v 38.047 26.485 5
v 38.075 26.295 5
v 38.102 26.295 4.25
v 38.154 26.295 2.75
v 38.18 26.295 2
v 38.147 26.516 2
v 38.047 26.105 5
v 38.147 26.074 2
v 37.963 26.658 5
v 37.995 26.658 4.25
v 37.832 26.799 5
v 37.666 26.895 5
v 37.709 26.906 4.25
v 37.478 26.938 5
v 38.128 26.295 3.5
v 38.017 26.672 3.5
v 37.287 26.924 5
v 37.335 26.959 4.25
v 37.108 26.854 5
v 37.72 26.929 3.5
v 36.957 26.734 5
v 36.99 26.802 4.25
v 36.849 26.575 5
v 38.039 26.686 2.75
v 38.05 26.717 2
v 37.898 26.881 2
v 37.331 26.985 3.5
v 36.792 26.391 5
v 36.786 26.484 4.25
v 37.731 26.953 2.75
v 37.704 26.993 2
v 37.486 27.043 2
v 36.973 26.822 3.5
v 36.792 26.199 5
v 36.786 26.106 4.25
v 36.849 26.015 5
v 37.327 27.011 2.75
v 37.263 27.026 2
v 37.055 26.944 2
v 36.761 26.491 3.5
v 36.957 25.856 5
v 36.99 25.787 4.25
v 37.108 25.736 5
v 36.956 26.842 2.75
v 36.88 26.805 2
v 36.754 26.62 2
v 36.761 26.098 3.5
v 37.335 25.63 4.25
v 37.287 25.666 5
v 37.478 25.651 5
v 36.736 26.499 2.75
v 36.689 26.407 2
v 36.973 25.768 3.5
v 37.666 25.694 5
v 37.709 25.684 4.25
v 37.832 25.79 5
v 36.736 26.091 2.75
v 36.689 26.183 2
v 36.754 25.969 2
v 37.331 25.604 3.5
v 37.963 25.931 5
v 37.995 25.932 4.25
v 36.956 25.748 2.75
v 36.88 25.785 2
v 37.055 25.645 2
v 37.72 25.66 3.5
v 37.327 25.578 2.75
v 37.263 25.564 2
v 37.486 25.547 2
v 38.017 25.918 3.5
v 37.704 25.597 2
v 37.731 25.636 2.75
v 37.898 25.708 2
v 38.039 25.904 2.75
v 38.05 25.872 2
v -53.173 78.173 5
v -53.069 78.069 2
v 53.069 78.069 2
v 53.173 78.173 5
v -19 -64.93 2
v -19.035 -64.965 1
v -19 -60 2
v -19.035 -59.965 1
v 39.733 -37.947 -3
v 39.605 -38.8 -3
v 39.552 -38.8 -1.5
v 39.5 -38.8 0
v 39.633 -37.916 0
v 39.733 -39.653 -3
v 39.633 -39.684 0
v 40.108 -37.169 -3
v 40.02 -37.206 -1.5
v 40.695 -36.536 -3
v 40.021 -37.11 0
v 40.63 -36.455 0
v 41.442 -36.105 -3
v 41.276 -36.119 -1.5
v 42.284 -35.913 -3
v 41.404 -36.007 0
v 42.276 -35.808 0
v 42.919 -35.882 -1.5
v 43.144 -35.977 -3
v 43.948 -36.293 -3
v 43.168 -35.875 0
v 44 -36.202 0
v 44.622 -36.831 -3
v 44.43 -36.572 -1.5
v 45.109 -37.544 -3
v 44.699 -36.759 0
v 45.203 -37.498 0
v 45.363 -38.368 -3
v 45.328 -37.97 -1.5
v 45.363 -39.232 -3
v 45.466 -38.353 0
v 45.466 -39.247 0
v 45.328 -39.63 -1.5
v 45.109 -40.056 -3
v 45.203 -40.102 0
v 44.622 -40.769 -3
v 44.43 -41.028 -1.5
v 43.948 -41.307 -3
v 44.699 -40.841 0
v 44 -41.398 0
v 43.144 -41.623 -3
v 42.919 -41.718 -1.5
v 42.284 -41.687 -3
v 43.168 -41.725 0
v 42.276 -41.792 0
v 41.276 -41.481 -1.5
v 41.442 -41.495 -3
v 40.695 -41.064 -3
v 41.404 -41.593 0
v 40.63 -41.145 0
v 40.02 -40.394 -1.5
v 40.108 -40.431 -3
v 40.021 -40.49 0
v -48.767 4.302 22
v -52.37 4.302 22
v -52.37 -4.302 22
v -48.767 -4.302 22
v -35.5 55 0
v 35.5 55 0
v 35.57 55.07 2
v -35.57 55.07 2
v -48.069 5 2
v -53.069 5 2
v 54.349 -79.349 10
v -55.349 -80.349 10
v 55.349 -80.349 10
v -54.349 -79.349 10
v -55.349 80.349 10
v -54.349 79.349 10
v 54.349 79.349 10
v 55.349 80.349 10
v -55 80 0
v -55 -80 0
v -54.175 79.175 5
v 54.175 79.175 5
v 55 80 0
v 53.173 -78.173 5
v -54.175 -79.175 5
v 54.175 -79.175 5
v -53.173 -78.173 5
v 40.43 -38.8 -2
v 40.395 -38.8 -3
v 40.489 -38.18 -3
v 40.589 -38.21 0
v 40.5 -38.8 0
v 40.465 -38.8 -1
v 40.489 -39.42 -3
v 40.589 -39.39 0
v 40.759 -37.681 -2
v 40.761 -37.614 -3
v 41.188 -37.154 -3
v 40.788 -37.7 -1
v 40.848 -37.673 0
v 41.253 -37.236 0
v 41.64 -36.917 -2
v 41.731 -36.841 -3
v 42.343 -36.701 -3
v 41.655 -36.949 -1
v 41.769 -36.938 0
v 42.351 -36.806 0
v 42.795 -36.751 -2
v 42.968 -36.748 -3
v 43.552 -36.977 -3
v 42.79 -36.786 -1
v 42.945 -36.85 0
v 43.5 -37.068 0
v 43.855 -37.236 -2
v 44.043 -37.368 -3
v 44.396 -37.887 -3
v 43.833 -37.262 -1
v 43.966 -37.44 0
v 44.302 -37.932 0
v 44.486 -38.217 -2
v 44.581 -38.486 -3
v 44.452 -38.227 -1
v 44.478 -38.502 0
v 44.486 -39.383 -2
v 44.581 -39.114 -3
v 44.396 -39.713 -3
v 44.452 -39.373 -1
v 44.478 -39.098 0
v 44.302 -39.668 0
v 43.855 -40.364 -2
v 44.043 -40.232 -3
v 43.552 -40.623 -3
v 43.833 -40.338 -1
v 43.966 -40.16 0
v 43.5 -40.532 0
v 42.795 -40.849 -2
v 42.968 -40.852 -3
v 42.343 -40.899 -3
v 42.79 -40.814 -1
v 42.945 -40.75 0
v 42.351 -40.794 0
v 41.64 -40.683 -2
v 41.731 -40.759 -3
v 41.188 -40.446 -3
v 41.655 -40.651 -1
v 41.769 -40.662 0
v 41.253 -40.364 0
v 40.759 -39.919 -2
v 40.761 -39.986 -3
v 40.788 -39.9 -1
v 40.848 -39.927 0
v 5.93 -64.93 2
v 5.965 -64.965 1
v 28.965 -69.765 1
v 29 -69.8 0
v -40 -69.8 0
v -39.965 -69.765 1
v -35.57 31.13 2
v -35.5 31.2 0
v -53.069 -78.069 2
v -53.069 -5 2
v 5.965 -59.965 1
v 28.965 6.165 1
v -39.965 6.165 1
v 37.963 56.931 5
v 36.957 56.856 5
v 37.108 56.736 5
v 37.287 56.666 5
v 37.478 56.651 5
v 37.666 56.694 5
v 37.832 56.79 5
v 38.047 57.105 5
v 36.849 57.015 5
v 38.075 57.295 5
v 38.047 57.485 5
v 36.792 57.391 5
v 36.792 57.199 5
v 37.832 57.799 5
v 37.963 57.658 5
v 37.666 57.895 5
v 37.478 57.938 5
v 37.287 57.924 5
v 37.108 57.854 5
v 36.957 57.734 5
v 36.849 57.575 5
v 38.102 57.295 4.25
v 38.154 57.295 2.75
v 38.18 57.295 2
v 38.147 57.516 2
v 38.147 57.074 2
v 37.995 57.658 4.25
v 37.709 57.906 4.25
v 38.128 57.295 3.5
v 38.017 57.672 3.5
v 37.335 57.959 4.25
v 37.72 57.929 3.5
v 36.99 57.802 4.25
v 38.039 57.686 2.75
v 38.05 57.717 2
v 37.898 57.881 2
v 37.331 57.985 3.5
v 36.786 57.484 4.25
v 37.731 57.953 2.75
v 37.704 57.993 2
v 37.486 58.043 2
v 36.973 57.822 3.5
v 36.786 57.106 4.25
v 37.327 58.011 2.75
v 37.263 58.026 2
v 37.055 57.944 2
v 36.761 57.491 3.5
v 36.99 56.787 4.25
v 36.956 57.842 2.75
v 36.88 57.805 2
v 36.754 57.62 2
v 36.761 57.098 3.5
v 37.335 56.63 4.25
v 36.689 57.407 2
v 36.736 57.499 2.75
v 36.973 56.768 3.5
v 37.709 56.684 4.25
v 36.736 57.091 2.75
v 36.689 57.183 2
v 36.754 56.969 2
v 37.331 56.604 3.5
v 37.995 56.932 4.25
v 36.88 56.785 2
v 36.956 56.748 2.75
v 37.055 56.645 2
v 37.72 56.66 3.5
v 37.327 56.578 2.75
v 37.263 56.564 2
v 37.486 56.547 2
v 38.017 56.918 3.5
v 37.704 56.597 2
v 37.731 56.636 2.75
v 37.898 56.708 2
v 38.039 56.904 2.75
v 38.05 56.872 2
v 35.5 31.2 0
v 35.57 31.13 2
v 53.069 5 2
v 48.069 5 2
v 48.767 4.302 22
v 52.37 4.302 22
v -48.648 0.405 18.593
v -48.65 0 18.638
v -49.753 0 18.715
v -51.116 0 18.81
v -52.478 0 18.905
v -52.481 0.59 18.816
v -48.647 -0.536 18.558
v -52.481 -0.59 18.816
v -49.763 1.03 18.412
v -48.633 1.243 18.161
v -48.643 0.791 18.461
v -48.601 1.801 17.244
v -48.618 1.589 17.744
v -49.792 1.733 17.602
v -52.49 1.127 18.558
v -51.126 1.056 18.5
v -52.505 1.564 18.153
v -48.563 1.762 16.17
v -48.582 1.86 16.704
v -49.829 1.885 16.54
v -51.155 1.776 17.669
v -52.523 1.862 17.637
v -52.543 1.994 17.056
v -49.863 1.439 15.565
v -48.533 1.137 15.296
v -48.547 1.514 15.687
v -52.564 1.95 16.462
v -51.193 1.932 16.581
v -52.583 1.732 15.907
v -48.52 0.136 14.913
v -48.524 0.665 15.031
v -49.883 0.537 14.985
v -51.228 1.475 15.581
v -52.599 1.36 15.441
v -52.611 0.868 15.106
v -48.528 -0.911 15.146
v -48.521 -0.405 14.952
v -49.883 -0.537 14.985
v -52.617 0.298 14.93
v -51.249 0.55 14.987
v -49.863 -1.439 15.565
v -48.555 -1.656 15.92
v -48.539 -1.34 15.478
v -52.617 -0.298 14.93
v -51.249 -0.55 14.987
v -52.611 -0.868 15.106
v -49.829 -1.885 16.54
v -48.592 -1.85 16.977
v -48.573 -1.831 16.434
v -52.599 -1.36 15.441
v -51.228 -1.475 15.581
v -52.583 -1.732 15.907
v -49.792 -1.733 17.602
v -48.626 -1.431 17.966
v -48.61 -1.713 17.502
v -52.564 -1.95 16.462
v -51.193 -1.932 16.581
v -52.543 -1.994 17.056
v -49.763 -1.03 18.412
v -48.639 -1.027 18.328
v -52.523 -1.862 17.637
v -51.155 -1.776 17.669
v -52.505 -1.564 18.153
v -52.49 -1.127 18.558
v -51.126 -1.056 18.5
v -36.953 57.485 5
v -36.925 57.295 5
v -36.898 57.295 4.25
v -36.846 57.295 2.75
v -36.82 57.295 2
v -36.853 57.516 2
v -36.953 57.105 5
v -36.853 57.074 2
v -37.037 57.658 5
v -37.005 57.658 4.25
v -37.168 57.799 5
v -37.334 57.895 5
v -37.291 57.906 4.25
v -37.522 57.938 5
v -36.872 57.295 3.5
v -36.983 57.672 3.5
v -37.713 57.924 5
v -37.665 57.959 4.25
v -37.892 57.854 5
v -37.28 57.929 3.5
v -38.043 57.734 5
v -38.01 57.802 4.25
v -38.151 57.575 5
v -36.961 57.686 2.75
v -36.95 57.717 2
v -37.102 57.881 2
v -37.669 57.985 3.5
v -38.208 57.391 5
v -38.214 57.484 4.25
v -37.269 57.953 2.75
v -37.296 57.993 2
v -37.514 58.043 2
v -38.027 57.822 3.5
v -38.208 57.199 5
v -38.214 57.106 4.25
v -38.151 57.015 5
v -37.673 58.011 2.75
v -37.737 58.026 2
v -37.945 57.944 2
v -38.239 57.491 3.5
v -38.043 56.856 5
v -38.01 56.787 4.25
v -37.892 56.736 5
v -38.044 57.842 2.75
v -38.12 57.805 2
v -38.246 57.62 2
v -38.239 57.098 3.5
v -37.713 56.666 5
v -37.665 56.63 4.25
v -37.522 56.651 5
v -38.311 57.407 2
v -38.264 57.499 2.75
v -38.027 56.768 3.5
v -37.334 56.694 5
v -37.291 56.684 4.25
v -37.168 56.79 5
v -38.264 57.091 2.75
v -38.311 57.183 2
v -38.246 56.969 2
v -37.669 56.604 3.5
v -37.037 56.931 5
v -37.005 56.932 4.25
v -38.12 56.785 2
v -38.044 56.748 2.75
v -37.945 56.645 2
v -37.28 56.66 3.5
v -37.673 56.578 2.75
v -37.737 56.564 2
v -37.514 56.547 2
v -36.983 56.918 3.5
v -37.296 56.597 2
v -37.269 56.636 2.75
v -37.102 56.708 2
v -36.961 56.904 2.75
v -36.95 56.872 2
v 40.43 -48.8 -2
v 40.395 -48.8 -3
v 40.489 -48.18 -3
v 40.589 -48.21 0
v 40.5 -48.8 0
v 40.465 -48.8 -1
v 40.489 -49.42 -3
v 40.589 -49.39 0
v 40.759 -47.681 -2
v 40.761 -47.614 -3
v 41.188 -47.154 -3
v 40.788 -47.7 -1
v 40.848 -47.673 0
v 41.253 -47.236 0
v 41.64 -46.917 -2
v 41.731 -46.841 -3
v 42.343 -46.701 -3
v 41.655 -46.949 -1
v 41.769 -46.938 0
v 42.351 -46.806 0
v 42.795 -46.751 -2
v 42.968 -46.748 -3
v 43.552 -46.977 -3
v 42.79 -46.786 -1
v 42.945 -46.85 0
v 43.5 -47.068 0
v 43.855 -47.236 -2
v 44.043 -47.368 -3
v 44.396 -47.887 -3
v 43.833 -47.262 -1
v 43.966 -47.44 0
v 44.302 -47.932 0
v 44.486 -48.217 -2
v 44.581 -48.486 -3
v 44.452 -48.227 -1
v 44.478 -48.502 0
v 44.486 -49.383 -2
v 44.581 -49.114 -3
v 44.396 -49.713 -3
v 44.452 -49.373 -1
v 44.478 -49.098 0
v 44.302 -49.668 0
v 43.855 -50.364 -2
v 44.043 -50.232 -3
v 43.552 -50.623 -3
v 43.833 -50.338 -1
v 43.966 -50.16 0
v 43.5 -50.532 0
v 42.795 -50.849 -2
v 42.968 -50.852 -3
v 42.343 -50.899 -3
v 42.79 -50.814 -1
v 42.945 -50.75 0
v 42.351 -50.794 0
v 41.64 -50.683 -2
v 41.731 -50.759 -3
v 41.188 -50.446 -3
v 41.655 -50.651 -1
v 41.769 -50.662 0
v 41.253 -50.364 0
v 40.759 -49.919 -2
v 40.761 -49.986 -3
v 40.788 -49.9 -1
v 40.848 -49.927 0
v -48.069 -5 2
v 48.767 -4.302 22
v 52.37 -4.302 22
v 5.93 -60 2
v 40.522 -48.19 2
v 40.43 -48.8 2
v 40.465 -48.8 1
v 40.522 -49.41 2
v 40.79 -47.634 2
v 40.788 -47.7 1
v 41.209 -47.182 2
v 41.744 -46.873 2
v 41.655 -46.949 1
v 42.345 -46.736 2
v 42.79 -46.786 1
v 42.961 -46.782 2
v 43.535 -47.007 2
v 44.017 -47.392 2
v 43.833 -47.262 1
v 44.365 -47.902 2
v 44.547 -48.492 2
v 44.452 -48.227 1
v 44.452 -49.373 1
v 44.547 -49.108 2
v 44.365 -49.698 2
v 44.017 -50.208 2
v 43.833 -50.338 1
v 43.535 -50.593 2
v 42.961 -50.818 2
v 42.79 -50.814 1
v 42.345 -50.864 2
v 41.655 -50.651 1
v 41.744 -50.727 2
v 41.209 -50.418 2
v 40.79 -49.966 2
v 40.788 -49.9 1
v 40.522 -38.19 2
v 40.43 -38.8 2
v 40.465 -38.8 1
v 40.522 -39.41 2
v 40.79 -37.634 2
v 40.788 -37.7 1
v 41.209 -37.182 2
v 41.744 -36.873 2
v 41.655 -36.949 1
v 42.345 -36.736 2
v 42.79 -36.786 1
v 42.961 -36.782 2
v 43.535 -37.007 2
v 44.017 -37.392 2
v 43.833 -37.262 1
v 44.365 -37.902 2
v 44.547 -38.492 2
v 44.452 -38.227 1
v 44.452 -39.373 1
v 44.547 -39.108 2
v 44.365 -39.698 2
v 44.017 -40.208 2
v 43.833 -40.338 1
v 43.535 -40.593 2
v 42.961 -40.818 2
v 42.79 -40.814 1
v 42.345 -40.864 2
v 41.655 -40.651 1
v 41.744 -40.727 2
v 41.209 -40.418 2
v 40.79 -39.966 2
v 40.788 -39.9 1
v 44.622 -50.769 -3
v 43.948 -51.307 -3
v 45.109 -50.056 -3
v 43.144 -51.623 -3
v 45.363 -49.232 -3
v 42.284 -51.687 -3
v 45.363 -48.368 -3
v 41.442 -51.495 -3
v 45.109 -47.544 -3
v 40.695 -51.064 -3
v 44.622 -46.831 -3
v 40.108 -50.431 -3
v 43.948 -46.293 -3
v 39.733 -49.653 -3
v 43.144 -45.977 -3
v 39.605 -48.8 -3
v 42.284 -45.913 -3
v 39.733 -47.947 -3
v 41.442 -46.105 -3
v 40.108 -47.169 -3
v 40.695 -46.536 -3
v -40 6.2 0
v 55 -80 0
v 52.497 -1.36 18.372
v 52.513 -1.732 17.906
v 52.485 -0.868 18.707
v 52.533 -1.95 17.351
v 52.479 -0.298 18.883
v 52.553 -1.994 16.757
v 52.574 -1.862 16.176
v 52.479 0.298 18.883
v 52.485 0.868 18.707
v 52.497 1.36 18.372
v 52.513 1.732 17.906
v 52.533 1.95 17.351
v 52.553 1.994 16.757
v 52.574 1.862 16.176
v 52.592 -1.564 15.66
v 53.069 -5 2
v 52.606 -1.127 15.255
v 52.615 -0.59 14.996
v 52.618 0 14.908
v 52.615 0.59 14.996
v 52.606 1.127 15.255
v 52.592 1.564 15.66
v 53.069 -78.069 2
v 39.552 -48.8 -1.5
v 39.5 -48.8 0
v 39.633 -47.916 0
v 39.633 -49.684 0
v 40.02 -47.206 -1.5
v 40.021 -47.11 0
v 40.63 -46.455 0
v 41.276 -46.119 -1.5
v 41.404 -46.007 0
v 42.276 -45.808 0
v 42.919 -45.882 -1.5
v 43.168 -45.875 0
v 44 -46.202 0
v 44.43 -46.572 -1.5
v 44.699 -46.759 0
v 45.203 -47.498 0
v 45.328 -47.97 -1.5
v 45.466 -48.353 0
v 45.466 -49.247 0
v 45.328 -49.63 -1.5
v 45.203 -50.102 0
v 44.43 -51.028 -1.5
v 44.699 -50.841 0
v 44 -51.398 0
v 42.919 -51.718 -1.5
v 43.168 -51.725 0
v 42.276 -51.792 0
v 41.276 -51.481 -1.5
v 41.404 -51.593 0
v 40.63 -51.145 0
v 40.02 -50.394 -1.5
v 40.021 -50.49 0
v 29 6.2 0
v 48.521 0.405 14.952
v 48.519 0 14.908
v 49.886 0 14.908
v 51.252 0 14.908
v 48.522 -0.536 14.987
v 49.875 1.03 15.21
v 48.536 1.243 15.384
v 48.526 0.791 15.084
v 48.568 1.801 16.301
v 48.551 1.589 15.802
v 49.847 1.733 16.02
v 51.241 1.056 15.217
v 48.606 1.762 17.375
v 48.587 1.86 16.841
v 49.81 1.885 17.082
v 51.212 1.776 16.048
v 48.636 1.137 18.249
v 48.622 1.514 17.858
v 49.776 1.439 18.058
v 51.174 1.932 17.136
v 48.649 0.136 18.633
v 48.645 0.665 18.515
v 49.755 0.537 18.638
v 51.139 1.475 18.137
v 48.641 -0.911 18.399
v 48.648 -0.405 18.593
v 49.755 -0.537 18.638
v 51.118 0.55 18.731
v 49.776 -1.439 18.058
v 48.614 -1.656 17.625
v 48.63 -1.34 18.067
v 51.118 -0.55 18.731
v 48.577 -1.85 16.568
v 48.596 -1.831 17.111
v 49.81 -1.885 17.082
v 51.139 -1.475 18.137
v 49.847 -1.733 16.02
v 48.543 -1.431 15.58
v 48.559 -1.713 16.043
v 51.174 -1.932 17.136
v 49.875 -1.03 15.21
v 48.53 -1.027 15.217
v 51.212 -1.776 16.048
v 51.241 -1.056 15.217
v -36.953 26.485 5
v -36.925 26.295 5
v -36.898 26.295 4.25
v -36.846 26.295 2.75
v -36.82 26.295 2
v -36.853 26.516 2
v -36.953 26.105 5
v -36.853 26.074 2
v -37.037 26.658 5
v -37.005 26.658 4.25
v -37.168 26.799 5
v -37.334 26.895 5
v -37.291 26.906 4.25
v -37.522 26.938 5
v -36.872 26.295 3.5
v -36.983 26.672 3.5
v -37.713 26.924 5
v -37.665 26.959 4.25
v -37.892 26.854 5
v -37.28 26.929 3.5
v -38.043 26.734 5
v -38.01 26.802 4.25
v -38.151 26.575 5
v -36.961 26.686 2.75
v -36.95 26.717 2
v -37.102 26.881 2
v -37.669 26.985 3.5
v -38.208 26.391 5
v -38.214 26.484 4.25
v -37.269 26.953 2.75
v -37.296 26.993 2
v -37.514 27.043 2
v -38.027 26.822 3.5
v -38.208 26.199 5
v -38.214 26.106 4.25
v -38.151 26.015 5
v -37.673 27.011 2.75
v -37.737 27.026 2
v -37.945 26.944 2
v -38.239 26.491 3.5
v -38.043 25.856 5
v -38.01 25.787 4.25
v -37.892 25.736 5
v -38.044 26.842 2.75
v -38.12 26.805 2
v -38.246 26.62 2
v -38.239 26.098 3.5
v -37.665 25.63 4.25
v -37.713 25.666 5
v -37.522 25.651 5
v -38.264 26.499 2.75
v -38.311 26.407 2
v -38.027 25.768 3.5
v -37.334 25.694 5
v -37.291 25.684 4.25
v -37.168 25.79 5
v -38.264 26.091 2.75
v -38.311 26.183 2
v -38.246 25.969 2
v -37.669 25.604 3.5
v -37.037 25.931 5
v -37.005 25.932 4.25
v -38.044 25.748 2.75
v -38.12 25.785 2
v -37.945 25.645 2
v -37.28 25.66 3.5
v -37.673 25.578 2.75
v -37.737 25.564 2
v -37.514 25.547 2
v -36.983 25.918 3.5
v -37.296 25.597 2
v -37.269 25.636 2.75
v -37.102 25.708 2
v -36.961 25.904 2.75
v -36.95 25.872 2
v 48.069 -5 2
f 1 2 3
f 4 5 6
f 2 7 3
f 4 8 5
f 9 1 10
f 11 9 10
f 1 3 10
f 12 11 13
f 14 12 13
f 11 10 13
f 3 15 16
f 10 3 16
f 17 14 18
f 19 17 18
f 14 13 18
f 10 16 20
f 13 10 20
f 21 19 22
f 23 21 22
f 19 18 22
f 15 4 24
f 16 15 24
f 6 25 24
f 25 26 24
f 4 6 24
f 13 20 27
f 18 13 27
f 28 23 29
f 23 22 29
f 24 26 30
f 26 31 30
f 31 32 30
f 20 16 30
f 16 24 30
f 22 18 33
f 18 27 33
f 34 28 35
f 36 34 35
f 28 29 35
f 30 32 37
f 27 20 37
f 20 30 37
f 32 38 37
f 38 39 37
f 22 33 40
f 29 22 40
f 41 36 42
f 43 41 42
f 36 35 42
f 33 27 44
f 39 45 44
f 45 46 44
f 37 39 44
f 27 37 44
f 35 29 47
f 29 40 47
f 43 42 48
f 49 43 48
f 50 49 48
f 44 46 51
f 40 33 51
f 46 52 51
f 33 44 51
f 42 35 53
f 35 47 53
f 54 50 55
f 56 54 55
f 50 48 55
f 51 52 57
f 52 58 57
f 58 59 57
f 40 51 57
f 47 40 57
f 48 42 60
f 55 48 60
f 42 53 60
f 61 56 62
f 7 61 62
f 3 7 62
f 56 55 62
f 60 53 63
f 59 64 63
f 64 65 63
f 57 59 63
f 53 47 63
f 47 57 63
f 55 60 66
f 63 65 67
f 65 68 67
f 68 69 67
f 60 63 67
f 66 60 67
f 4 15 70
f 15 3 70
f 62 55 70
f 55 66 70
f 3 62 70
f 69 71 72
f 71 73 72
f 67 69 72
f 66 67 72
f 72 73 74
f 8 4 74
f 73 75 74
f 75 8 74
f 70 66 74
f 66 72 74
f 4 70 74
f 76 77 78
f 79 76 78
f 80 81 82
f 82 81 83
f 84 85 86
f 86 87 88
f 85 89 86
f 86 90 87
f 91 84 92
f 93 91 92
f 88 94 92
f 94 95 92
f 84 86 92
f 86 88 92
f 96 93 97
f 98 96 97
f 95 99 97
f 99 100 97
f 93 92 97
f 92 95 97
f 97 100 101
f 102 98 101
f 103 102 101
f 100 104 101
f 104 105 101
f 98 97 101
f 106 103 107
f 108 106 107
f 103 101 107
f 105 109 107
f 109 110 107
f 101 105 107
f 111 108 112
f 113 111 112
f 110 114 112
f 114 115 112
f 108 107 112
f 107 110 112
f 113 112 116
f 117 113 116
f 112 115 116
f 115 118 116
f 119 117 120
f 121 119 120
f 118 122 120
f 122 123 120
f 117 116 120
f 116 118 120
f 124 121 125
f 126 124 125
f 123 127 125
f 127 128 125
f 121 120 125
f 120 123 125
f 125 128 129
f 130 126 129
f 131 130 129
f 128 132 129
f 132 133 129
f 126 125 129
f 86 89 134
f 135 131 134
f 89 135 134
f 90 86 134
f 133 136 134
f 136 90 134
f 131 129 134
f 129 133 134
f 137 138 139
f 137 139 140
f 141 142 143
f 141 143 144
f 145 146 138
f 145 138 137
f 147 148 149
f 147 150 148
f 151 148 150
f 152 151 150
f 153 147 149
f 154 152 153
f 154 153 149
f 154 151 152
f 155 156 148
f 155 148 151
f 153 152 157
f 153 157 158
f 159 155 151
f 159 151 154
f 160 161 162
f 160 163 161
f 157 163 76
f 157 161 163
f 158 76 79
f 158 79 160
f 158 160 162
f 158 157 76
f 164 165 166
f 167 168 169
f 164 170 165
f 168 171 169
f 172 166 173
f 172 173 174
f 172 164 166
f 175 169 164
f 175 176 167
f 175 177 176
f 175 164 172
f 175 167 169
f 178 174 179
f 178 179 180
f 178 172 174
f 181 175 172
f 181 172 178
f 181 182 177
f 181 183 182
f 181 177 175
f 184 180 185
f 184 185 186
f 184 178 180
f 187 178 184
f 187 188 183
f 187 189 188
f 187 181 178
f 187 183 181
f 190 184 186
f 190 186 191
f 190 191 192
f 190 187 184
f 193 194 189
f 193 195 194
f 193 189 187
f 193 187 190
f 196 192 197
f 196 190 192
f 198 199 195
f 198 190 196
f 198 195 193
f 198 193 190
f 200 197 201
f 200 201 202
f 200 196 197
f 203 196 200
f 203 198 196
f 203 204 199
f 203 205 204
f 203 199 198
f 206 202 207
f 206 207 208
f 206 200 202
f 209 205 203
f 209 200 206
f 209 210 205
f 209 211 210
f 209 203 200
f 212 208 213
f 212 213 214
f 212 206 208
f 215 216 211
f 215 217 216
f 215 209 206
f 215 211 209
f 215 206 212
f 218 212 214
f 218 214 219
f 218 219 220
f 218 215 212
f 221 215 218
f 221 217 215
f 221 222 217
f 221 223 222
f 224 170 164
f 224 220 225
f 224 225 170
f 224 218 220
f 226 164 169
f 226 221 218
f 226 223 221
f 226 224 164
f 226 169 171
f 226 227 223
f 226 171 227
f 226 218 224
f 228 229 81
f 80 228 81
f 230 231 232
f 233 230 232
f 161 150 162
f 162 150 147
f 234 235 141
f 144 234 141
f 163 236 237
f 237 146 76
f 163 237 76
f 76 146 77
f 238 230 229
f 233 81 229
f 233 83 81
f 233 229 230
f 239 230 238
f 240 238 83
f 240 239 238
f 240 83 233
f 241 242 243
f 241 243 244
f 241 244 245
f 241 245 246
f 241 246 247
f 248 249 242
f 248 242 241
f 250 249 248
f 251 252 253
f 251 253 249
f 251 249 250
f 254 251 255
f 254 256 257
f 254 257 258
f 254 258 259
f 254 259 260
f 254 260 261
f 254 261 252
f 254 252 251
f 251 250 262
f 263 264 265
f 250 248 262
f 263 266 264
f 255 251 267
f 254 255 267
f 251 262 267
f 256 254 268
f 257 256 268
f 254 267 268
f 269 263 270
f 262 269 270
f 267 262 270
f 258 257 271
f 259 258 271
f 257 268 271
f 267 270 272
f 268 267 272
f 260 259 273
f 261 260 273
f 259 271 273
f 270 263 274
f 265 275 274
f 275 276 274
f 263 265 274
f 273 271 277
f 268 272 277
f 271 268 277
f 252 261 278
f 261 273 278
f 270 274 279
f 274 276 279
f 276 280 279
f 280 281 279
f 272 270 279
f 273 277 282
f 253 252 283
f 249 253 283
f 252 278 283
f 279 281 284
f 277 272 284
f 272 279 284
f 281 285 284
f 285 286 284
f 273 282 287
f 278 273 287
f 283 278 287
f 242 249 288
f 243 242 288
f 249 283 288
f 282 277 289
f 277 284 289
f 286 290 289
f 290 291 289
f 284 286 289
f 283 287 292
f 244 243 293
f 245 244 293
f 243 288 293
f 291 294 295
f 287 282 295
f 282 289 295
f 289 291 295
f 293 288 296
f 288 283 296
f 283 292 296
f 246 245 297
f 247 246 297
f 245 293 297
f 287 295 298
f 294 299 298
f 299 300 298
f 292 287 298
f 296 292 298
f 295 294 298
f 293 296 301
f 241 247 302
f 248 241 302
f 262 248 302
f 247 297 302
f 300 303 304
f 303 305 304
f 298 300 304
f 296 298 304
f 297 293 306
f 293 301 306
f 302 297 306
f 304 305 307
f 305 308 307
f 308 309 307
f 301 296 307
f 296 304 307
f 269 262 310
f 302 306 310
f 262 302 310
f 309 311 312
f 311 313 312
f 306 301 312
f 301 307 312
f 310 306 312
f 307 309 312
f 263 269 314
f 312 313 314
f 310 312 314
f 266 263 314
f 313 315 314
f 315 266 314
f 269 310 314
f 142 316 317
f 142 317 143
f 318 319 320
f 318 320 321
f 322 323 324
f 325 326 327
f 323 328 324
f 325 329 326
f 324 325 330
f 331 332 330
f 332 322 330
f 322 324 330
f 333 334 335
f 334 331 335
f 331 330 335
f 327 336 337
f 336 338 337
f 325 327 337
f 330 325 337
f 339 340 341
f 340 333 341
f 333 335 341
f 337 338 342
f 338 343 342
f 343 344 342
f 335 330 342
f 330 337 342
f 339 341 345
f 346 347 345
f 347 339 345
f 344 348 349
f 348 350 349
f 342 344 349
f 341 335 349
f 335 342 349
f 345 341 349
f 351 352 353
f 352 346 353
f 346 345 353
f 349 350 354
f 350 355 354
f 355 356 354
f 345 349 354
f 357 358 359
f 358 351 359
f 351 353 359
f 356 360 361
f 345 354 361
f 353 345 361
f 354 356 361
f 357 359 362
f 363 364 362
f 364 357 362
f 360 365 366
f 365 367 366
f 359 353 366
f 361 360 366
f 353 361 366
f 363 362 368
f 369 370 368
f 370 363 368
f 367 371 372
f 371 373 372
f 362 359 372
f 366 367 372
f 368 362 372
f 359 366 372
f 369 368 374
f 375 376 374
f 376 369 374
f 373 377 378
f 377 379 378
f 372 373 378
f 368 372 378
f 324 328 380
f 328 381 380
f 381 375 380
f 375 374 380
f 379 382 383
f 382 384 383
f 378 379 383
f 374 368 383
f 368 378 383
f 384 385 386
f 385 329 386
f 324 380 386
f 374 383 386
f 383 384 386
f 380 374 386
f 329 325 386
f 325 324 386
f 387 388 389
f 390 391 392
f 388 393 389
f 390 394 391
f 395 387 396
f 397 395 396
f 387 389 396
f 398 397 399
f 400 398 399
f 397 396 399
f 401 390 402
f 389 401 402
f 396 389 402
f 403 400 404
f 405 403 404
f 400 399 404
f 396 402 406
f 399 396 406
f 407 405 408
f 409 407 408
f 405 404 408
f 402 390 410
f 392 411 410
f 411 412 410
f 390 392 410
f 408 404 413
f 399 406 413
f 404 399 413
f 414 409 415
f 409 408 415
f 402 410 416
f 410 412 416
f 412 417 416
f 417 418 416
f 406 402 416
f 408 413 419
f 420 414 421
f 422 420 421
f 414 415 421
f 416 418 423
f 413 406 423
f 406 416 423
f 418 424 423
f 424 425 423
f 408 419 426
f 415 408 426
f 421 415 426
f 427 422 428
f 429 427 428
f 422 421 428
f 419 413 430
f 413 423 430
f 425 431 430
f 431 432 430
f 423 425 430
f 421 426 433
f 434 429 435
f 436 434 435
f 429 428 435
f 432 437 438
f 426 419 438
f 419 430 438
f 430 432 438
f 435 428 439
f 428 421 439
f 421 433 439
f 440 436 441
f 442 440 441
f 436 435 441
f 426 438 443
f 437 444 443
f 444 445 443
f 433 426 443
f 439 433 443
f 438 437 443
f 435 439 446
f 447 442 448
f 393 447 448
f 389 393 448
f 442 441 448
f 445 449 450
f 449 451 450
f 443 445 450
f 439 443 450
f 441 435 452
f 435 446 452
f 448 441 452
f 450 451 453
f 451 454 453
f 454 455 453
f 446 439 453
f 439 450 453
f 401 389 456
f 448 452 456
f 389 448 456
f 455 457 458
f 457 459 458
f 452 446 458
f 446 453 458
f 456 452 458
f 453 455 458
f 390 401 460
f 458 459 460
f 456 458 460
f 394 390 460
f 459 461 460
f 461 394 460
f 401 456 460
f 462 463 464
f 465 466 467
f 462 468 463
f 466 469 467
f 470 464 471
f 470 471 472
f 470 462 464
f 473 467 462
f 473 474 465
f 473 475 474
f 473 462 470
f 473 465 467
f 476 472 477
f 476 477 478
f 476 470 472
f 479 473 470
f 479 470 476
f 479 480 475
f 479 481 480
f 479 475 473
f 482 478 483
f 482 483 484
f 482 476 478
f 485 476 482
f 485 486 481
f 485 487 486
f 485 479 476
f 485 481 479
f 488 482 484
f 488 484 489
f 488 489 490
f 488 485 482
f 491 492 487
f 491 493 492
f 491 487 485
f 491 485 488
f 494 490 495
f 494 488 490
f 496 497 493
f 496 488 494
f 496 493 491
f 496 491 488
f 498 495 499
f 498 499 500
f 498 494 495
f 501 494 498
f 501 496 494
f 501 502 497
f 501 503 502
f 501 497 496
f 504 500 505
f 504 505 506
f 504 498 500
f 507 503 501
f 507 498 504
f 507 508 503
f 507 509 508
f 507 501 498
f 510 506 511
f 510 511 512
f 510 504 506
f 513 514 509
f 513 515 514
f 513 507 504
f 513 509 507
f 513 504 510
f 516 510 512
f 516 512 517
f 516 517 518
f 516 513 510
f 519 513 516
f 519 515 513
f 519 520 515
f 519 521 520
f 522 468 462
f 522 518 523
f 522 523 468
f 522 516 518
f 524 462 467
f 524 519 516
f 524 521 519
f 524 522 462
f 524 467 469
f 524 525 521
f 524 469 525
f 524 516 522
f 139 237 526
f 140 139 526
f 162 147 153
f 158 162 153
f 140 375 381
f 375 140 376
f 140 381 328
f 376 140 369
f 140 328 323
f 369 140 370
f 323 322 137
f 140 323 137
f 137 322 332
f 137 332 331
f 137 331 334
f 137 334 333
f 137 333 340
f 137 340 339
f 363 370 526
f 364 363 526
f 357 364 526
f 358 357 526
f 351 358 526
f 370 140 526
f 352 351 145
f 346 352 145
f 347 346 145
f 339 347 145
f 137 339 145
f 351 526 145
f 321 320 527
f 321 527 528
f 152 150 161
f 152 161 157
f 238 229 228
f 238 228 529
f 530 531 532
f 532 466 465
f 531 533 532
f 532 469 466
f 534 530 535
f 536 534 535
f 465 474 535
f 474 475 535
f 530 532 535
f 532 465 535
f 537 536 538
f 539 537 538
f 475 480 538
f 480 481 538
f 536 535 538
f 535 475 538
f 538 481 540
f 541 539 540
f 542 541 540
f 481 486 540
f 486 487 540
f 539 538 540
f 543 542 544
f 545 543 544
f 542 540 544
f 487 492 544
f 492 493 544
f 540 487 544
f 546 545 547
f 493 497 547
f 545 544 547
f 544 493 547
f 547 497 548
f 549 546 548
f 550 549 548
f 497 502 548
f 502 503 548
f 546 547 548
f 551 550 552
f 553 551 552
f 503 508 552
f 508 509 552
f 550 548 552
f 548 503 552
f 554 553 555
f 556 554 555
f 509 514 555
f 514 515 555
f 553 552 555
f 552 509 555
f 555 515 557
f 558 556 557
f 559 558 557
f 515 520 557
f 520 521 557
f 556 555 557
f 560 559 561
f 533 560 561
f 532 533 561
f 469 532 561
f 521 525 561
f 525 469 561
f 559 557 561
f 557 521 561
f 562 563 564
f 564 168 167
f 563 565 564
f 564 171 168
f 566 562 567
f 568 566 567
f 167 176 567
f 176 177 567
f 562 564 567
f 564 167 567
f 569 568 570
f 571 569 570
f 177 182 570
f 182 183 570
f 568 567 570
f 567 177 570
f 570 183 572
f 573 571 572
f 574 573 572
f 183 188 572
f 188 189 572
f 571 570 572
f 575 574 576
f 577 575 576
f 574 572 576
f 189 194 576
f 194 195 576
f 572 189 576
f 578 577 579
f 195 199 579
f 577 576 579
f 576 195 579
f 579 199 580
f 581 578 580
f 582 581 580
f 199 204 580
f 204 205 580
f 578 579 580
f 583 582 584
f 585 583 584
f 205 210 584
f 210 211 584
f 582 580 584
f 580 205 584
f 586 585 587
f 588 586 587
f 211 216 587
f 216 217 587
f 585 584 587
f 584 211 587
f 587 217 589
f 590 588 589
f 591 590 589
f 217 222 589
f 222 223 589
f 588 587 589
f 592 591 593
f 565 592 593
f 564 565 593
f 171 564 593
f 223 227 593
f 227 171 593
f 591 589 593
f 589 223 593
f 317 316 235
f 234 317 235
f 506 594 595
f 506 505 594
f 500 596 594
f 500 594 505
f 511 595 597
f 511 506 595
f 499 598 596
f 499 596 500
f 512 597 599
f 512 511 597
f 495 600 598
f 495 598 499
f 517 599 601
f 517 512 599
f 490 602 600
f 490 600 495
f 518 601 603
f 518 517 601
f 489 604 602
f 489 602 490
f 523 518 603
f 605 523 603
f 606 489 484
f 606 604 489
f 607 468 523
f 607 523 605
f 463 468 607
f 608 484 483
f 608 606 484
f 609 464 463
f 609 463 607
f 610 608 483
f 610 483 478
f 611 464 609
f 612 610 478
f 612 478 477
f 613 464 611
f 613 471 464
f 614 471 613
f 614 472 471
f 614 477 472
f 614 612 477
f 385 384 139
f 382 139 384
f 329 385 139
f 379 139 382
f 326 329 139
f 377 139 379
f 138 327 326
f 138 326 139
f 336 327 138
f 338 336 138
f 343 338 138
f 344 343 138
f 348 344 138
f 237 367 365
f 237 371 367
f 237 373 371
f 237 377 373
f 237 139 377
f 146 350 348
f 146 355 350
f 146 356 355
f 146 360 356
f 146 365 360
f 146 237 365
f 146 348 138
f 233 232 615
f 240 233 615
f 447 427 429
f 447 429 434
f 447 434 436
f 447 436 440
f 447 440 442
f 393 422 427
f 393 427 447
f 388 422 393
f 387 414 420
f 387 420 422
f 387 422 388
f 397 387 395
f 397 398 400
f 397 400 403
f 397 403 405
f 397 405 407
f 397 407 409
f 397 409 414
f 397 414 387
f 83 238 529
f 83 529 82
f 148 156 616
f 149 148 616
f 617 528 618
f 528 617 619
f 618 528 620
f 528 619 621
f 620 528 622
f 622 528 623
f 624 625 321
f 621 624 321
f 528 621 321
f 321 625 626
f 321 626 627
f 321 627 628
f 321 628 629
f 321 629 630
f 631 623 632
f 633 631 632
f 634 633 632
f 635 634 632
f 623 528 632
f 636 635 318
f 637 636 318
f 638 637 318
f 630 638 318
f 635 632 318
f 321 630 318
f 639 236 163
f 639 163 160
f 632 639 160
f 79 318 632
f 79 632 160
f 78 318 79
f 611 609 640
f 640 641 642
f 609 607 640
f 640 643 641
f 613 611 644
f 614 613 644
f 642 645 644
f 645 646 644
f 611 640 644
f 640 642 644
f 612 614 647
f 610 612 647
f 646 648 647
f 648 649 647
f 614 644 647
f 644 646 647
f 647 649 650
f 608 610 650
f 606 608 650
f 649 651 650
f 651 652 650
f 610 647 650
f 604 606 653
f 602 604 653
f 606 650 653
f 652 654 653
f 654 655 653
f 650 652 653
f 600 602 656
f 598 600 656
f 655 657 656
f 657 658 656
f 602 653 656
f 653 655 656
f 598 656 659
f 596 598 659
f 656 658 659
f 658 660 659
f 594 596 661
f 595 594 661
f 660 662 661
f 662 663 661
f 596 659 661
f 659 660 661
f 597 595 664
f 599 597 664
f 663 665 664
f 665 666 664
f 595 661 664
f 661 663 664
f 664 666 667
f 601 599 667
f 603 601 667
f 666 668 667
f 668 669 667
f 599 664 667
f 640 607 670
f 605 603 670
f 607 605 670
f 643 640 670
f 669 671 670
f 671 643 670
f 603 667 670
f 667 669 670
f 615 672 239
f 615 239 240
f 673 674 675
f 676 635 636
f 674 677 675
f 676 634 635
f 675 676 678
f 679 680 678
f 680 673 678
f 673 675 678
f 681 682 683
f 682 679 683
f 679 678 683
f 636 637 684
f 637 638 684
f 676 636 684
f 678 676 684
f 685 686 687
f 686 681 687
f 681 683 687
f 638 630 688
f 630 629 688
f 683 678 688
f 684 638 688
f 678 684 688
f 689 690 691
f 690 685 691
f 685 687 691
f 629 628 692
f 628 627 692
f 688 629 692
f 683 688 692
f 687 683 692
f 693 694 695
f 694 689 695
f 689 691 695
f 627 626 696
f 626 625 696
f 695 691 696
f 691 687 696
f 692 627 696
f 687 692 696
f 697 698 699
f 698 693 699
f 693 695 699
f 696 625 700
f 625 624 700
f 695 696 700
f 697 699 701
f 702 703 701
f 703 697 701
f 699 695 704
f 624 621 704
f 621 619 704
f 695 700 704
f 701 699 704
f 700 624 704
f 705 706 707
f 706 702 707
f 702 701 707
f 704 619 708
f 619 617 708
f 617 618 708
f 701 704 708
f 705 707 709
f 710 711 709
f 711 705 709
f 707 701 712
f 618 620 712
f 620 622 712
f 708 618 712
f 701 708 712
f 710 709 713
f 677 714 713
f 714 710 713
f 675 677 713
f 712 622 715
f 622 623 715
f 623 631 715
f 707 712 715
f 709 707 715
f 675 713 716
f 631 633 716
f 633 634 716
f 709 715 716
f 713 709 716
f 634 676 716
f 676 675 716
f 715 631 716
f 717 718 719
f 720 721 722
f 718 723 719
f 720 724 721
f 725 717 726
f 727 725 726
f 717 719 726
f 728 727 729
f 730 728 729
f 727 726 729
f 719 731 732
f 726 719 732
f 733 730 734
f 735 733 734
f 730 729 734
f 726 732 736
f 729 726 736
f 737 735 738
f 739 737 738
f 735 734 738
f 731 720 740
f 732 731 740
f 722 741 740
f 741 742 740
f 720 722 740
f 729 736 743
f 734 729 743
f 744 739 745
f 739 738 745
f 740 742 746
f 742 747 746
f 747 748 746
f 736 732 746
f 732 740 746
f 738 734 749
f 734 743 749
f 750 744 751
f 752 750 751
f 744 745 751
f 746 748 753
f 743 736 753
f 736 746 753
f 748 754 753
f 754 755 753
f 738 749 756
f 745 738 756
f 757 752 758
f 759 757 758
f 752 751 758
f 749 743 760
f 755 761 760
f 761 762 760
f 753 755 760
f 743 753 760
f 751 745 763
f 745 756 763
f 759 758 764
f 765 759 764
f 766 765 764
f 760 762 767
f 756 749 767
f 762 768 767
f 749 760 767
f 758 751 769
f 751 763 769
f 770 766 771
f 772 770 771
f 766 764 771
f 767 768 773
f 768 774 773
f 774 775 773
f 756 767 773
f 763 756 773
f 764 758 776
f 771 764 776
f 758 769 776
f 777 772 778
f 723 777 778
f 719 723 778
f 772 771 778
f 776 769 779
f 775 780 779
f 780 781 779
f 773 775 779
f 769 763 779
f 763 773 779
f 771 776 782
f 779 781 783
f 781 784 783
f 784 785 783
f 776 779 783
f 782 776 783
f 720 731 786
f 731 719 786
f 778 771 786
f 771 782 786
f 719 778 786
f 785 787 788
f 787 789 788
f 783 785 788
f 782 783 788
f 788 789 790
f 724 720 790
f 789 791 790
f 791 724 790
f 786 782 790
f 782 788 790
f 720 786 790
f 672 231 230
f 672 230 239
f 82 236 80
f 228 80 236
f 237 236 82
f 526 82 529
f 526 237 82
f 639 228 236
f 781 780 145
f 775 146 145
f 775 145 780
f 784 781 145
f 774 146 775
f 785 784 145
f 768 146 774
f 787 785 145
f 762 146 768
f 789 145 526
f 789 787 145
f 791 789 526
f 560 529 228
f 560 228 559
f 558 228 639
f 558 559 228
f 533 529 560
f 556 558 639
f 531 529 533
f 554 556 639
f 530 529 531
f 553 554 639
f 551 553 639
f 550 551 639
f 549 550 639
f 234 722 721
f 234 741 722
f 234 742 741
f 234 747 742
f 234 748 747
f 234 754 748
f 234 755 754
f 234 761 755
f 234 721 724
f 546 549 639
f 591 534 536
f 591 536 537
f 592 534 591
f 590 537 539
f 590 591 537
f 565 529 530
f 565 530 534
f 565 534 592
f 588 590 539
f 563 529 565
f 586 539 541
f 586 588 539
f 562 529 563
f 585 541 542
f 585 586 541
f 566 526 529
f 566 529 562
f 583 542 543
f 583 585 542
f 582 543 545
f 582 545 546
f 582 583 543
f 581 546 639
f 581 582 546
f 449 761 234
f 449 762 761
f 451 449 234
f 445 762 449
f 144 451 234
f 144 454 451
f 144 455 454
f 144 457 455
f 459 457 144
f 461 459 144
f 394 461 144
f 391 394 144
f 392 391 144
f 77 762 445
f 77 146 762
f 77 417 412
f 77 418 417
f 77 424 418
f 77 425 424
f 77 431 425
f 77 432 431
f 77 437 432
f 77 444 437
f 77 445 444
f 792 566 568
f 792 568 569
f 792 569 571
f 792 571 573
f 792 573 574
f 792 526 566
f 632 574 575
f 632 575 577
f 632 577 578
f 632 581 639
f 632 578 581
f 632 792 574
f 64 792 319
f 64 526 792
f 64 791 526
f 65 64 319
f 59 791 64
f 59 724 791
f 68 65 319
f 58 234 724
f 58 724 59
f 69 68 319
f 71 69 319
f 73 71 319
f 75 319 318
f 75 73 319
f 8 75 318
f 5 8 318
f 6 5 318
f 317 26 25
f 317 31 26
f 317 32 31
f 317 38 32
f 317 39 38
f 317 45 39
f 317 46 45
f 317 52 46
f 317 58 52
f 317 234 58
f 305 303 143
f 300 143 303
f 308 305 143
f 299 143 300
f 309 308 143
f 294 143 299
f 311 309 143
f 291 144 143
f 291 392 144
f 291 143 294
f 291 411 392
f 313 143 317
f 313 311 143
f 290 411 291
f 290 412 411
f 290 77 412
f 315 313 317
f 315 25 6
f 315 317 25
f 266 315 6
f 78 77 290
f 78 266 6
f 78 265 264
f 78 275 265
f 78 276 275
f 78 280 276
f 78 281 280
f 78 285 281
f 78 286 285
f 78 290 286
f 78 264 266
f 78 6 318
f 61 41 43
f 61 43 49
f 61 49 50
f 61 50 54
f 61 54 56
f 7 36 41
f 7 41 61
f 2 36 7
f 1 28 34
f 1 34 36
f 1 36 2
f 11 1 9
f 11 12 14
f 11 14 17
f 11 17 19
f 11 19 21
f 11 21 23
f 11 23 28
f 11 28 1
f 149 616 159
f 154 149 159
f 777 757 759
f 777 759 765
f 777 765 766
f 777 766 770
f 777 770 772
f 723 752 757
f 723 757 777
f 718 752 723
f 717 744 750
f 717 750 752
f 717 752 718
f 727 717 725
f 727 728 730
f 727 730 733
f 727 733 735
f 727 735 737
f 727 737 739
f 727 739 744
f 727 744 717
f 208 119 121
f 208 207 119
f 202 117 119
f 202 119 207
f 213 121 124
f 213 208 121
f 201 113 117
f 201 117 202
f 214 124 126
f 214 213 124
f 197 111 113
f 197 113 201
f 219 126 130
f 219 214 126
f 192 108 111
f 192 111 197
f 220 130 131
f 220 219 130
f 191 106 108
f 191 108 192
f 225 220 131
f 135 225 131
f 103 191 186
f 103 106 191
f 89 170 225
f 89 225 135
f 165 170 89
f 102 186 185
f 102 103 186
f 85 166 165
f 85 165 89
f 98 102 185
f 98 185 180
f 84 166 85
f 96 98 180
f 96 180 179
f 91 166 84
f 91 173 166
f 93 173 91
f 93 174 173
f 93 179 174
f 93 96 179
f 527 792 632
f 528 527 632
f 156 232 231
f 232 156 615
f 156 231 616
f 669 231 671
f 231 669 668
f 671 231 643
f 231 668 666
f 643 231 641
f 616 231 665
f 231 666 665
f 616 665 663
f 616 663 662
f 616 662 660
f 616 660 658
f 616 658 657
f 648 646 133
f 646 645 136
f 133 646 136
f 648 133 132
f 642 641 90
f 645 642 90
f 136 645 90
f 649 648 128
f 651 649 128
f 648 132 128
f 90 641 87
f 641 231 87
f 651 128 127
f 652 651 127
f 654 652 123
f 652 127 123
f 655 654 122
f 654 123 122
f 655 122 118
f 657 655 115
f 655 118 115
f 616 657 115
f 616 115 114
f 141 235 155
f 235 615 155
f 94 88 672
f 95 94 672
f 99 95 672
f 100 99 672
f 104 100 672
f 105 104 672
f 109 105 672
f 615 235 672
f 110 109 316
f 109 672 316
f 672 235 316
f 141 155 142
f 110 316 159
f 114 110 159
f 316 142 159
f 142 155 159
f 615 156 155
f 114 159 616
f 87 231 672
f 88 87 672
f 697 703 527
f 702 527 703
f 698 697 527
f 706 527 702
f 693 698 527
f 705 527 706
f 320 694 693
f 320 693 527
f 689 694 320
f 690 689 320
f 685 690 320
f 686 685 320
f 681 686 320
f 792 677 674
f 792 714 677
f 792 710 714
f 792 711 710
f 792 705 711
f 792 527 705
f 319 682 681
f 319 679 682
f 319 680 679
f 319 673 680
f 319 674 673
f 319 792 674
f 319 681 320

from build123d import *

# Parameters (mm, degrees)
SKETCH1_W                     = 110
SKETCH1_H                     = 160
BOSS_EXTRUDE1_DEPTH           = 10
BOSS_EXTRUDE1_DRAFT           = -2
SHELL1_T                      = -2
SKETCH3_W                     = 108.69841539
SKETCH3_H                     = 158.69841539
CUT_EXTRUDE3_DEPTH            = 5
CUT_EXTRUDE3_DRAFT            = -2
SKETCH4_W                     = 71
SKETCH4_H                     = 23.8
CUT_EXTRUDE4_DEPTH            = 2
CUT_EXTRUDE4_DRAFT            = 2
SKETCH5_R                     = 3
SKETCH5_R_2                   = 2
BOSS_EXTRUDE2_DEPTH           = 3
BOSS_EXTRUDE2_DRAFT           = 2
BOSS_EXTRUDE2_PROFILE_2_DEPTH = 3
BOSS_EXTRUDE2_PROFILE_2_DRAFT = 2
SKETCH8_R                     = 2
CUT_EXTRUDE5_DEPTH            = 2
CUT_EXTRUDE5_DRAFT            = 2
CUT_EXTRUDE5_PROFILE_2_DEPTH  = 2
CUT_EXTRUDE5_PROFILE_2_DRAFT  = 2
SKETCH10_R                    = 0.75
BOSS_EXTRUDE3_DEPTH           = 3
BOSS_EXTRUDE3_DRAFT           = 2
BOSS_EXTRUDE3_PROFILE_2_DEPTH = 3
BOSS_EXTRUDE3_PROFILE_2_DRAFT = 2
BOSS_EXTRUDE3_PROFILE_3_DEPTH = 3
BOSS_EXTRUDE3_PROFILE_3_DRAFT = 2
BOSS_EXTRUDE3_PROFILE_4_DEPTH = 3
BOSS_EXTRUDE3_PROFILE_4_DRAFT = 2
SKETCH13_W                    = 5
SKETCH13_H                    = 10
BOSS_EXTRUDE8_DEPTH           = 20
BOSS_EXTRUDE8_DRAFT           = 2
BOSS_EXTRUDE8_PROFILE_2_DEPTH = 20
BOSS_EXTRUDE8_PROFILE_2_DRAFT = 2
CUT_EXTRUDE8_REACH            = 138.446
SKETCH21_R                    = 2
CUT_EXTRUDE8_DRAFT            = -2
CUT_EXTRUDE9_REACH            = 138.446
SKETCH22_R                    = 2
CUT_EXTRUDE9_DRAFT            = -2
SKETCH27_W                    = 69
SKETCH27_H                    = 76
CUT_EXTRUDE10_DEPTH           = 1
CUT_EXTRUDE10_DRAFT           = -2
SKETCH28_W                    = 25
SKETCH28_H                    = 5
CUT_EXTRUDE11_DEPTH           = 1
CUT_EXTRUDE11_DRAFT           = -2


with BuildPart() as part:
    # Sketch1 → Boss-Extrude1 (with draft: the straight prism first)
    with BuildSketch(Plane.XY):
        Rectangle(SKETCH1_W, SKETCH1_H)
    extrude(amount=BOSS_EXTRUDE1_DEPTH)
    # Boss-Extrude1: the draft: its side faces are tilted about the plane it starts from
    boss_extrude1_sides = [part.faces().sort_by_distance(p)[0] for p in [
        (55, 0, 5),
        (0, 80, 5),
        (-55, 0, 5),
        (0, -80, 5),
    ]]
    draft(boss_extrude1_sides, Plane.XY, BOSS_EXTRUDE1_DRAFT)

    # Shell1
    shell1_openings = [part.faces().sort_by_distance(p)[0] for p in [
        (0, 0, 10),
    ]]
    offset(amount=SHELL1_T, openings=shell1_openings, kind=Kind.INTERSECTION)


with BuildPart() as cut_extrude3_tool:
    # Sketch3 → Cut-Extrude3 (with draft: the straight prism first)
    with BuildSketch(Plane.XY.offset(10)):
        Rectangle(SKETCH3_W, SKETCH3_H)
    extrude(amount=-CUT_EXTRUDE3_DEPTH)
    # Cut-Extrude3: the draft: its side faces are tilted about the plane it starts from
    cut_extrude3_sides = [cut_extrude3_tool.faces().sort_by_distance(p)[0] for p in [
        (54.349207695, 0, 7.5),
        (0, 79.349207695, 7.5),
        (-54.349207695, 0, 7.5),
        (0, -79.349207695, 7.5),
    ]]
    draft(cut_extrude3_sides, Plane.XY.offset(10), CUT_EXTRUDE3_DRAFT)


with BuildPart() as part_1:
    add(part.part)

    # Cut-Extrude3: cut by cut_extrude3_tool
    add(cut_extrude3_tool.part, mode=Mode.SUBTRACT)


with BuildPart() as cut_extrude4_tool:
    # Sketch4 → Cut-Extrude4 (with draft: the straight prism first)
    with BuildSketch(Plane(origin=(0, 0, 0), x_dir=(-1, 0, 0), z_dir=(0, 0, -1))):
        with Locations((0, 43.1)):
            Rectangle(SKETCH4_W, SKETCH4_H)
    extrude(amount=-CUT_EXTRUDE4_DEPTH)
    # Cut-Extrude4: the draft: its side faces are tilted about the plane it starts from
    cut_extrude4_sides = [cut_extrude4_tool.faces().sort_by_distance(p)[0] for p in [
        (-35.5, 43.1, 1),
        (0, 55, 1),
        (35.5, 43.1, 1),
        (0, 31.2, 1),
    ]]
    draft(cut_extrude4_sides, Plane(origin=(0, 0, 0), x_dir=(-1, 0, 0), z_dir=(0, 0, -1)), CUT_EXTRUDE4_DRAFT)


with BuildPart() as part_2:
    add(part_1.part)

    # Cut-Extrude4: cut by cut_extrude4_tool
    add(cut_extrude4_tool.part, mode=Mode.SUBTRACT)


with BuildPart() as boss_extrude2_tool:
    # Sketch5 → Boss-Extrude2 (with draft: the straight prism first)
    with BuildSketch(Plane(origin=(0, 0, 0), x_dir=(-1, 0, 0), z_dir=(0, 0, -1))):
        with Locations((-42.5, -38.8)):
            Circle(SKETCH5_R)
        with Locations((-42.5, -38.8)):
            Circle(SKETCH5_R_2, mode=Mode.SUBTRACT)
    extrude(amount=BOSS_EXTRUDE2_DEPTH)
    # Boss-Extrude2: the draft: its side faces are tilted about the plane it starts from
    boss_extrude2_sides = [boss_extrude2_tool.faces().sort_by_distance(p)[0] for p in [
        (45.5, -38.8, -1.5),
        (44.5, -38.8, -1.5),
    ]]
    draft(boss_extrude2_sides, Plane(origin=(0, 0, 0), x_dir=(-1, 0, 0), z_dir=(0, 0, -1)), BOSS_EXTRUDE2_DRAFT)


with BuildPart() as part_3:
    add(part_2.part)

    # Boss-Extrude2: add boss_extrude2_tool
    add(boss_extrude2_tool.part)


with BuildPart() as boss_extrude2_profile_2_tool:
    # Sketch5 → Boss-Extrude2 profile 2 (with draft: the straight prism first)
    with BuildSketch(Plane(origin=(0, 0, 0), x_dir=(-1, 0, 0), z_dir=(0, 0, -1))):
        with Locations((-42.5, -48.8)):
            Circle(SKETCH5_R)
        with Locations((-42.5, -48.8)):
            Circle(SKETCH5_R_2, mode=Mode.SUBTRACT)
    extrude(amount=BOSS_EXTRUDE2_PROFILE_2_DEPTH)
    # Boss-Extrude2 profile 2: the draft: its side faces are tilted about the plane it starts from
    boss_extrude2_profile_2_sides = [boss_extrude2_profile_2_tool.faces().sort_by_distance(p)[0] for p in [
        (45.5, -48.8, -1.5),
        (44.5, -48.8, -1.5),
    ]]
    draft(boss_extrude2_profile_2_sides, Plane(origin=(0, 0, 0), x_dir=(-1, 0, 0), z_dir=(0, 0, -1)), BOSS_EXTRUDE2_PROFILE_2_DRAFT)


with BuildPart() as part_4:
    add(part_3.part)

    # Boss-Extrude2 profile 2: add boss_extrude2_profile_2_tool
    add(boss_extrude2_profile_2_tool.part)


with BuildPart() as cut_extrude5_tool:
    # Sketch8 → Cut-Extrude5 (with draft: the straight prism first)
    with BuildSketch(Plane(origin=(0, 0, 0), x_dir=(-1, 0, 0), z_dir=(0, 0, -1))):
        with Locations((-42.5, -48.8)):
            Circle(SKETCH8_R)
    extrude(amount=-CUT_EXTRUDE5_DEPTH)
    # Cut-Extrude5: the draft: its side faces are tilted about the plane it starts from
    cut_extrude5_sides = [cut_extrude5_tool.faces().sort_by_distance(p)[0] for p in [
        (44.5, -48.8, 1),
    ]]
    draft(cut_extrude5_sides, Plane(origin=(0, 0, 0), x_dir=(-1, 0, 0), z_dir=(0, 0, -1)), CUT_EXTRUDE5_DRAFT)


with BuildPart() as part_5:
    add(part_4.part)

    # Cut-Extrude5: cut by cut_extrude5_tool
    add(cut_extrude5_tool.part, mode=Mode.SUBTRACT)


with BuildPart() as cut_extrude5_profile_2_tool:
    # Sketch8 → Cut-Extrude5 profile 2 (with draft: the straight prism first)
    with BuildSketch(Plane(origin=(0, 0, 0), x_dir=(-1, 0, 0), z_dir=(0, 0, -1))):
        with Locations((-42.5, -38.8)):
            Circle(SKETCH8_R)
    extrude(amount=-CUT_EXTRUDE5_PROFILE_2_DEPTH)
    # Cut-Extrude5 profile 2: the draft: its side faces are tilted about the plane it starts from
    cut_extrude5_profile_2_sides = [cut_extrude5_profile_2_tool.faces().sort_by_distance(p)[0] for p in [
        (44.5, -38.8, 1),
    ]]
    draft(cut_extrude5_profile_2_sides, Plane(origin=(0, 0, 0), x_dir=(-1, 0, 0), z_dir=(0, 0, -1)), CUT_EXTRUDE5_PROFILE_2_DRAFT)


with BuildPart() as part_6:
    add(part_5.part)

    # Cut-Extrude5 profile 2: cut by cut_extrude5_profile_2_tool
    add(cut_extrude5_profile_2_tool.part, mode=Mode.SUBTRACT)


with BuildPart() as boss_extrude3_tool:
    # Sketch10 → Boss-Extrude3 (with draft: the straight prism first)
    with BuildSketch(Plane.XY.offset(2)):
        with Locations((-37.569841539, 57.294841539)):
            Circle(SKETCH10_R)
    extrude(amount=BOSS_EXTRUDE3_DEPTH)
    # Boss-Extrude3: the draft: its side faces are tilted about the plane it starts from
    boss_extrude3_sides = [boss_extrude3_tool.faces().sort_by_distance(p)[0] for p in [
        (-38.319841539, 57.294841539, 3.5),
    ]]
    draft(boss_extrude3_sides, Plane.XY.offset(2), BOSS_EXTRUDE3_DRAFT)


with BuildPart() as part_7:
    add(part_6.part)

    # Boss-Extrude3: add boss_extrude3_tool
    add(boss_extrude3_tool.part)


with BuildPart() as boss_extrude3_profile_2_tool:
    # Sketch10 → Boss-Extrude3 profile 2 (with draft: the straight prism first)
    with BuildSketch(Plane.XY.offset(2)):
        with Locations((37.430158461, 57.294841539)):
            Circle(SKETCH10_R)
    extrude(amount=BOSS_EXTRUDE3_PROFILE_2_DEPTH)
    # Boss-Extrude3 profile 2: the draft: its side faces are tilted about the plane it starts from
    boss_extrude3_profile_2_sides = [boss_extrude3_profile_2_tool.faces().sort_by_distance(p)[0] for p in [
        (36.680158461, 57.294841539, 3.5),
    ]]
    draft(boss_extrude3_profile_2_sides, Plane.XY.offset(2), BOSS_EXTRUDE3_PROFILE_2_DRAFT)


with BuildPart() as part_8:
    add(part_7.part)

    # Boss-Extrude3 profile 2: add boss_extrude3_profile_2_tool
    add(boss_extrude3_profile_2_tool.part)


with BuildPart() as boss_extrude3_profile_3_tool:
    # Sketch10 → Boss-Extrude3 profile 3 (with draft: the straight prism first)
    with BuildSketch(Plane.XY.offset(2)):
        with Locations((37.430158461, 26.294841539)):
            Circle(SKETCH10_R)
    extrude(amount=BOSS_EXTRUDE3_PROFILE_3_DEPTH)
    # Boss-Extrude3 profile 3: the draft: its side faces are tilted about the plane it starts from
    boss_extrude3_profile_3_sides = [boss_extrude3_profile_3_tool.faces().sort_by_distance(p)[0] for p in [
        (36.680158461, 26.294841539, 3.5),
    ]]
    draft(boss_extrude3_profile_3_sides, Plane.XY.offset(2), BOSS_EXTRUDE3_PROFILE_3_DRAFT)


with BuildPart() as part_9:
    add(part_8.part)

    # Boss-Extrude3 profile 3: add boss_extrude3_profile_3_tool
    add(boss_extrude3_profile_3_tool.part)


with BuildPart() as boss_extrude3_profile_4_tool:
    # Sketch10 → Boss-Extrude3 profile 4 (with draft: the straight prism first)
    with BuildSketch(Plane.XY.offset(2)):
        with Locations((-37.569841539, 26.294841539)):
            Circle(SKETCH10_R)
    extrude(amount=BOSS_EXTRUDE3_PROFILE_4_DEPTH)
    # Boss-Extrude3 profile 4: the draft: its side faces are tilted about the plane it starts from
    boss_extrude3_profile_4_sides = [boss_extrude3_profile_4_tool.faces().sort_by_distance(p)[0] for p in [
        (-38.319841539, 26.294841539, 3.5),
    ]]
    draft(boss_extrude3_profile_4_sides, Plane.XY.offset(2), BOSS_EXTRUDE3_PROFILE_4_DRAFT)


with BuildPart() as part_10:
    add(part_9.part)

    # Boss-Extrude3 profile 4: add boss_extrude3_profile_4_tool
    add(boss_extrude3_profile_4_tool.part)


with BuildPart() as boss_extrude8_tool:
    # Sketch13 → Boss-Extrude8 (with draft: the straight prism first)
    with BuildSketch(Plane.XY.offset(2)):
        with Locations((-50.56862245, 0)):
            Rectangle(SKETCH13_W, SKETCH13_H)
    extrude(amount=BOSS_EXTRUDE8_DEPTH)
    # Boss-Extrude8: the draft: its side faces are tilted about the plane it starts from
    boss_extrude8_sides = [boss_extrude8_tool.faces().sort_by_distance(p)[0] for p in [
        (-50.56862245, 5, 12),
        (-53.06862245, 0, 12),
        (-50.56862245, -5, 12),
        (-48.06862245, 0, 12),
    ]]
    draft(boss_extrude8_sides, Plane.XY.offset(2), BOSS_EXTRUDE8_DRAFT)


with BuildPart() as part_11:
    add(part_10.part)

    # Boss-Extrude8: add boss_extrude8_tool
    add(boss_extrude8_tool.part)


with BuildPart() as boss_extrude8_profile_2_tool:
    # Sketch13 → Boss-Extrude8 profile 2 (with draft: the straight prism first)
    with BuildSketch(Plane.XY.offset(2)):
        with Locations((50.56862245, 0)):
            Rectangle(SKETCH13_W, SKETCH13_H)
    extrude(amount=BOSS_EXTRUDE8_PROFILE_2_DEPTH)
    # Boss-Extrude8 profile 2: the draft: its side faces are tilted about the plane it starts from
    boss_extrude8_profile_2_sides = [boss_extrude8_profile_2_tool.faces().sort_by_distance(p)[0] for p in [
        (50.56862245, -5, 12),
        (53.06862245, 0, 12),
        (50.56862245, 5, 12),
        (48.06862245, 0, 12),
    ]]
    draft(boss_extrude8_profile_2_sides, Plane.XY.offset(2), BOSS_EXTRUDE8_PROFILE_2_DRAFT)


with BuildPart() as part_12:
    add(part_11.part)

    # Boss-Extrude8 profile 2: add boss_extrude8_profile_2_tool
    add(boss_extrude8_profile_2_tool.part)

    # Cut-Extrude8: up to this plane
    cut_extrude8_end = Plane(origin=(-48.06862245, 5, 2), z_dir=(0.9993908270190958, 0, 0.034899496702501004))



with BuildPart() as cut_extrude8_long_prism_1:
    # Sketch21 → Cut-Extrude8 (the long prism of profile 1, to be tilted and cut off)
    with BuildSketch(Plane(origin=(-53.073742676, 0, 1.853375934), x_dir=(0.03489949670250101, 0, 0.9993908270190958), z_dir=(-0.9993908270190958, 0, 0.03489949670250101))):
        with Locations((15.062248779, 0)):
            Circle(SKETCH21_R)
    extrude(amount=-CUT_EXTRUDE8_REACH)
    cut_extrude8_tool1_sides = [cut_extrude8_long_prism_1.faces().sort_by_distance(p)[0] for p in [
        (16.562954451, 0, 12.491819684),
    ]]
    draft(cut_extrude8_tool1_sides, Plane(origin=(-53.073742676, 0, 1.853375934), x_dir=(0.03489949670250101, 0, 0.9993908270190958), z_dir=(-0.9993908270190958, 0, 0.03489949670250101)), CUT_EXTRUDE8_DRAFT)  # the draft: side faces tilted about the start plane


with BuildPart() as part_13:
    add(part_12.part)
    cut_extrude8_tool1 = split(cut_extrude8_long_prism_1.part, bisect_by=cut_extrude8_end, keep=Keep.BOTH, mode=Mode.PRIVATE)
    add(cut_extrude8_tool1.solids().sort_by_distance((-52.548078, 0, 16.906449))[0], mode=Mode.SUBTRACT)

    # Cut-Extrude9: up to this plane
    cut_extrude9_end = Plane(origin=(48.06862245, -5, 2), z_dir=(-0.9993908270190958, 0, 0.034899496702501004))



with BuildPart() as cut_extrude9_long_prism_1:
    # Sketch22 → Cut-Extrude9 (the long prism of profile 1, to be tilted and cut off)
    with BuildSketch(Plane(origin=(53.073742676, 0, 1.853375934), x_dir=(0.03489949670250101, 0, -0.9993908270190958), z_dir=(0.9993908270190958, 0, 0.03489949670250101))):
        with Locations((-15.062248779, 0)):
            Circle(SKETCH22_R)
    extrude(amount=-CUT_EXTRUDE9_REACH)
    cut_extrude9_tool1_sides = [cut_extrude9_long_prism_1.faces().sort_by_distance(p)[0] for p in [
        (-16.702552438, 0, 16.489382992),
    ]]
    draft(cut_extrude9_tool1_sides, Plane(origin=(53.073742676, 0, 1.853375934), x_dir=(0.03489949670250101, 0, -0.9993908270190958), z_dir=(0.9993908270190958, 0, 0.03489949670250101)), CUT_EXTRUDE9_DRAFT)  # the draft: side faces tilted about the start plane


with BuildPart() as part_14:
    add(part_13.part)
    cut_extrude9_tool1 = split(cut_extrude9_long_prism_1.part, bisect_by=cut_extrude9_end, keep=Keep.BOTH, mode=Mode.PRIVATE)
    add(cut_extrude9_tool1.solids().sort_by_distance((52.548078, 0, 16.906449))[0], mode=Mode.SUBTRACT)


with BuildPart() as cut_extrude10_tool:
    # Sketch27 → Cut-Extrude10 (with draft: the straight prism first)
    with BuildSketch(Plane(origin=(0, 0, 0), x_dir=(-1, 0, 0), z_dir=(0, 0, -1))):
        with Locations((5.5, -31.8)):
            Rectangle(SKETCH27_W, SKETCH27_H)
    extrude(amount=-CUT_EXTRUDE10_DEPTH)
    # Cut-Extrude10: the draft: its side faces are tilted about the plane it starts from
    cut_extrude10_sides = [cut_extrude10_tool.faces().sort_by_distance(p)[0] for p in [
        (-40, -31.8, 0.5),
        (-5.5, 6.2, 0.5),
        (29, -31.8, 0.5),
        (-5.5, -69.8, 0.5),
    ]]
    draft(cut_extrude10_sides, Plane(origin=(0, 0, 0), x_dir=(-1, 0, 0), z_dir=(0, 0, -1)), CUT_EXTRUDE10_DRAFT)


with BuildPart() as part_15:
    add(part_14.part)

    # Cut-Extrude10: cut by cut_extrude10_tool
    add(cut_extrude10_tool.part, mode=Mode.SUBTRACT)


with BuildPart() as cut_extrude11_tool:
    # Sketch28 → Cut-Extrude11 (with draft: the straight prism first)
    with BuildSketch(Plane(origin=(0, 0, 1), x_dir=(-1, 0, 0), z_dir=(0, 0, -1))):
        with Locations((6.534920769, -62.465079231)):
            Rectangle(SKETCH28_W, SKETCH28_H)
    extrude(amount=-CUT_EXTRUDE11_DEPTH)
    # Cut-Extrude11: the draft: its side faces are tilted about the plane it starts from
    cut_extrude11_sides = [cut_extrude11_tool.faces().sort_by_distance(p)[0] for p in [
        (-6.534920769, -59.965079231, 1.5),
        (5.965079231, -62.465079231, 1.5),
        (-6.534920769, -64.965079231, 1.5),
        (-19.034920769, -62.465079231, 1.5),
    ]]
    draft(cut_extrude11_sides, Plane(origin=(0, 0, 1), x_dir=(-1, 0, 0), z_dir=(0, 0, -1)), CUT_EXTRUDE11_DRAFT)


with BuildPart() as part_16:
    add(part_15.part)

    # Cut-Extrude11: cut by cut_extrude11_tool
    add(cut_extrude11_tool.part, mode=Mode.SUBTRACT)


solid = part_16.part
